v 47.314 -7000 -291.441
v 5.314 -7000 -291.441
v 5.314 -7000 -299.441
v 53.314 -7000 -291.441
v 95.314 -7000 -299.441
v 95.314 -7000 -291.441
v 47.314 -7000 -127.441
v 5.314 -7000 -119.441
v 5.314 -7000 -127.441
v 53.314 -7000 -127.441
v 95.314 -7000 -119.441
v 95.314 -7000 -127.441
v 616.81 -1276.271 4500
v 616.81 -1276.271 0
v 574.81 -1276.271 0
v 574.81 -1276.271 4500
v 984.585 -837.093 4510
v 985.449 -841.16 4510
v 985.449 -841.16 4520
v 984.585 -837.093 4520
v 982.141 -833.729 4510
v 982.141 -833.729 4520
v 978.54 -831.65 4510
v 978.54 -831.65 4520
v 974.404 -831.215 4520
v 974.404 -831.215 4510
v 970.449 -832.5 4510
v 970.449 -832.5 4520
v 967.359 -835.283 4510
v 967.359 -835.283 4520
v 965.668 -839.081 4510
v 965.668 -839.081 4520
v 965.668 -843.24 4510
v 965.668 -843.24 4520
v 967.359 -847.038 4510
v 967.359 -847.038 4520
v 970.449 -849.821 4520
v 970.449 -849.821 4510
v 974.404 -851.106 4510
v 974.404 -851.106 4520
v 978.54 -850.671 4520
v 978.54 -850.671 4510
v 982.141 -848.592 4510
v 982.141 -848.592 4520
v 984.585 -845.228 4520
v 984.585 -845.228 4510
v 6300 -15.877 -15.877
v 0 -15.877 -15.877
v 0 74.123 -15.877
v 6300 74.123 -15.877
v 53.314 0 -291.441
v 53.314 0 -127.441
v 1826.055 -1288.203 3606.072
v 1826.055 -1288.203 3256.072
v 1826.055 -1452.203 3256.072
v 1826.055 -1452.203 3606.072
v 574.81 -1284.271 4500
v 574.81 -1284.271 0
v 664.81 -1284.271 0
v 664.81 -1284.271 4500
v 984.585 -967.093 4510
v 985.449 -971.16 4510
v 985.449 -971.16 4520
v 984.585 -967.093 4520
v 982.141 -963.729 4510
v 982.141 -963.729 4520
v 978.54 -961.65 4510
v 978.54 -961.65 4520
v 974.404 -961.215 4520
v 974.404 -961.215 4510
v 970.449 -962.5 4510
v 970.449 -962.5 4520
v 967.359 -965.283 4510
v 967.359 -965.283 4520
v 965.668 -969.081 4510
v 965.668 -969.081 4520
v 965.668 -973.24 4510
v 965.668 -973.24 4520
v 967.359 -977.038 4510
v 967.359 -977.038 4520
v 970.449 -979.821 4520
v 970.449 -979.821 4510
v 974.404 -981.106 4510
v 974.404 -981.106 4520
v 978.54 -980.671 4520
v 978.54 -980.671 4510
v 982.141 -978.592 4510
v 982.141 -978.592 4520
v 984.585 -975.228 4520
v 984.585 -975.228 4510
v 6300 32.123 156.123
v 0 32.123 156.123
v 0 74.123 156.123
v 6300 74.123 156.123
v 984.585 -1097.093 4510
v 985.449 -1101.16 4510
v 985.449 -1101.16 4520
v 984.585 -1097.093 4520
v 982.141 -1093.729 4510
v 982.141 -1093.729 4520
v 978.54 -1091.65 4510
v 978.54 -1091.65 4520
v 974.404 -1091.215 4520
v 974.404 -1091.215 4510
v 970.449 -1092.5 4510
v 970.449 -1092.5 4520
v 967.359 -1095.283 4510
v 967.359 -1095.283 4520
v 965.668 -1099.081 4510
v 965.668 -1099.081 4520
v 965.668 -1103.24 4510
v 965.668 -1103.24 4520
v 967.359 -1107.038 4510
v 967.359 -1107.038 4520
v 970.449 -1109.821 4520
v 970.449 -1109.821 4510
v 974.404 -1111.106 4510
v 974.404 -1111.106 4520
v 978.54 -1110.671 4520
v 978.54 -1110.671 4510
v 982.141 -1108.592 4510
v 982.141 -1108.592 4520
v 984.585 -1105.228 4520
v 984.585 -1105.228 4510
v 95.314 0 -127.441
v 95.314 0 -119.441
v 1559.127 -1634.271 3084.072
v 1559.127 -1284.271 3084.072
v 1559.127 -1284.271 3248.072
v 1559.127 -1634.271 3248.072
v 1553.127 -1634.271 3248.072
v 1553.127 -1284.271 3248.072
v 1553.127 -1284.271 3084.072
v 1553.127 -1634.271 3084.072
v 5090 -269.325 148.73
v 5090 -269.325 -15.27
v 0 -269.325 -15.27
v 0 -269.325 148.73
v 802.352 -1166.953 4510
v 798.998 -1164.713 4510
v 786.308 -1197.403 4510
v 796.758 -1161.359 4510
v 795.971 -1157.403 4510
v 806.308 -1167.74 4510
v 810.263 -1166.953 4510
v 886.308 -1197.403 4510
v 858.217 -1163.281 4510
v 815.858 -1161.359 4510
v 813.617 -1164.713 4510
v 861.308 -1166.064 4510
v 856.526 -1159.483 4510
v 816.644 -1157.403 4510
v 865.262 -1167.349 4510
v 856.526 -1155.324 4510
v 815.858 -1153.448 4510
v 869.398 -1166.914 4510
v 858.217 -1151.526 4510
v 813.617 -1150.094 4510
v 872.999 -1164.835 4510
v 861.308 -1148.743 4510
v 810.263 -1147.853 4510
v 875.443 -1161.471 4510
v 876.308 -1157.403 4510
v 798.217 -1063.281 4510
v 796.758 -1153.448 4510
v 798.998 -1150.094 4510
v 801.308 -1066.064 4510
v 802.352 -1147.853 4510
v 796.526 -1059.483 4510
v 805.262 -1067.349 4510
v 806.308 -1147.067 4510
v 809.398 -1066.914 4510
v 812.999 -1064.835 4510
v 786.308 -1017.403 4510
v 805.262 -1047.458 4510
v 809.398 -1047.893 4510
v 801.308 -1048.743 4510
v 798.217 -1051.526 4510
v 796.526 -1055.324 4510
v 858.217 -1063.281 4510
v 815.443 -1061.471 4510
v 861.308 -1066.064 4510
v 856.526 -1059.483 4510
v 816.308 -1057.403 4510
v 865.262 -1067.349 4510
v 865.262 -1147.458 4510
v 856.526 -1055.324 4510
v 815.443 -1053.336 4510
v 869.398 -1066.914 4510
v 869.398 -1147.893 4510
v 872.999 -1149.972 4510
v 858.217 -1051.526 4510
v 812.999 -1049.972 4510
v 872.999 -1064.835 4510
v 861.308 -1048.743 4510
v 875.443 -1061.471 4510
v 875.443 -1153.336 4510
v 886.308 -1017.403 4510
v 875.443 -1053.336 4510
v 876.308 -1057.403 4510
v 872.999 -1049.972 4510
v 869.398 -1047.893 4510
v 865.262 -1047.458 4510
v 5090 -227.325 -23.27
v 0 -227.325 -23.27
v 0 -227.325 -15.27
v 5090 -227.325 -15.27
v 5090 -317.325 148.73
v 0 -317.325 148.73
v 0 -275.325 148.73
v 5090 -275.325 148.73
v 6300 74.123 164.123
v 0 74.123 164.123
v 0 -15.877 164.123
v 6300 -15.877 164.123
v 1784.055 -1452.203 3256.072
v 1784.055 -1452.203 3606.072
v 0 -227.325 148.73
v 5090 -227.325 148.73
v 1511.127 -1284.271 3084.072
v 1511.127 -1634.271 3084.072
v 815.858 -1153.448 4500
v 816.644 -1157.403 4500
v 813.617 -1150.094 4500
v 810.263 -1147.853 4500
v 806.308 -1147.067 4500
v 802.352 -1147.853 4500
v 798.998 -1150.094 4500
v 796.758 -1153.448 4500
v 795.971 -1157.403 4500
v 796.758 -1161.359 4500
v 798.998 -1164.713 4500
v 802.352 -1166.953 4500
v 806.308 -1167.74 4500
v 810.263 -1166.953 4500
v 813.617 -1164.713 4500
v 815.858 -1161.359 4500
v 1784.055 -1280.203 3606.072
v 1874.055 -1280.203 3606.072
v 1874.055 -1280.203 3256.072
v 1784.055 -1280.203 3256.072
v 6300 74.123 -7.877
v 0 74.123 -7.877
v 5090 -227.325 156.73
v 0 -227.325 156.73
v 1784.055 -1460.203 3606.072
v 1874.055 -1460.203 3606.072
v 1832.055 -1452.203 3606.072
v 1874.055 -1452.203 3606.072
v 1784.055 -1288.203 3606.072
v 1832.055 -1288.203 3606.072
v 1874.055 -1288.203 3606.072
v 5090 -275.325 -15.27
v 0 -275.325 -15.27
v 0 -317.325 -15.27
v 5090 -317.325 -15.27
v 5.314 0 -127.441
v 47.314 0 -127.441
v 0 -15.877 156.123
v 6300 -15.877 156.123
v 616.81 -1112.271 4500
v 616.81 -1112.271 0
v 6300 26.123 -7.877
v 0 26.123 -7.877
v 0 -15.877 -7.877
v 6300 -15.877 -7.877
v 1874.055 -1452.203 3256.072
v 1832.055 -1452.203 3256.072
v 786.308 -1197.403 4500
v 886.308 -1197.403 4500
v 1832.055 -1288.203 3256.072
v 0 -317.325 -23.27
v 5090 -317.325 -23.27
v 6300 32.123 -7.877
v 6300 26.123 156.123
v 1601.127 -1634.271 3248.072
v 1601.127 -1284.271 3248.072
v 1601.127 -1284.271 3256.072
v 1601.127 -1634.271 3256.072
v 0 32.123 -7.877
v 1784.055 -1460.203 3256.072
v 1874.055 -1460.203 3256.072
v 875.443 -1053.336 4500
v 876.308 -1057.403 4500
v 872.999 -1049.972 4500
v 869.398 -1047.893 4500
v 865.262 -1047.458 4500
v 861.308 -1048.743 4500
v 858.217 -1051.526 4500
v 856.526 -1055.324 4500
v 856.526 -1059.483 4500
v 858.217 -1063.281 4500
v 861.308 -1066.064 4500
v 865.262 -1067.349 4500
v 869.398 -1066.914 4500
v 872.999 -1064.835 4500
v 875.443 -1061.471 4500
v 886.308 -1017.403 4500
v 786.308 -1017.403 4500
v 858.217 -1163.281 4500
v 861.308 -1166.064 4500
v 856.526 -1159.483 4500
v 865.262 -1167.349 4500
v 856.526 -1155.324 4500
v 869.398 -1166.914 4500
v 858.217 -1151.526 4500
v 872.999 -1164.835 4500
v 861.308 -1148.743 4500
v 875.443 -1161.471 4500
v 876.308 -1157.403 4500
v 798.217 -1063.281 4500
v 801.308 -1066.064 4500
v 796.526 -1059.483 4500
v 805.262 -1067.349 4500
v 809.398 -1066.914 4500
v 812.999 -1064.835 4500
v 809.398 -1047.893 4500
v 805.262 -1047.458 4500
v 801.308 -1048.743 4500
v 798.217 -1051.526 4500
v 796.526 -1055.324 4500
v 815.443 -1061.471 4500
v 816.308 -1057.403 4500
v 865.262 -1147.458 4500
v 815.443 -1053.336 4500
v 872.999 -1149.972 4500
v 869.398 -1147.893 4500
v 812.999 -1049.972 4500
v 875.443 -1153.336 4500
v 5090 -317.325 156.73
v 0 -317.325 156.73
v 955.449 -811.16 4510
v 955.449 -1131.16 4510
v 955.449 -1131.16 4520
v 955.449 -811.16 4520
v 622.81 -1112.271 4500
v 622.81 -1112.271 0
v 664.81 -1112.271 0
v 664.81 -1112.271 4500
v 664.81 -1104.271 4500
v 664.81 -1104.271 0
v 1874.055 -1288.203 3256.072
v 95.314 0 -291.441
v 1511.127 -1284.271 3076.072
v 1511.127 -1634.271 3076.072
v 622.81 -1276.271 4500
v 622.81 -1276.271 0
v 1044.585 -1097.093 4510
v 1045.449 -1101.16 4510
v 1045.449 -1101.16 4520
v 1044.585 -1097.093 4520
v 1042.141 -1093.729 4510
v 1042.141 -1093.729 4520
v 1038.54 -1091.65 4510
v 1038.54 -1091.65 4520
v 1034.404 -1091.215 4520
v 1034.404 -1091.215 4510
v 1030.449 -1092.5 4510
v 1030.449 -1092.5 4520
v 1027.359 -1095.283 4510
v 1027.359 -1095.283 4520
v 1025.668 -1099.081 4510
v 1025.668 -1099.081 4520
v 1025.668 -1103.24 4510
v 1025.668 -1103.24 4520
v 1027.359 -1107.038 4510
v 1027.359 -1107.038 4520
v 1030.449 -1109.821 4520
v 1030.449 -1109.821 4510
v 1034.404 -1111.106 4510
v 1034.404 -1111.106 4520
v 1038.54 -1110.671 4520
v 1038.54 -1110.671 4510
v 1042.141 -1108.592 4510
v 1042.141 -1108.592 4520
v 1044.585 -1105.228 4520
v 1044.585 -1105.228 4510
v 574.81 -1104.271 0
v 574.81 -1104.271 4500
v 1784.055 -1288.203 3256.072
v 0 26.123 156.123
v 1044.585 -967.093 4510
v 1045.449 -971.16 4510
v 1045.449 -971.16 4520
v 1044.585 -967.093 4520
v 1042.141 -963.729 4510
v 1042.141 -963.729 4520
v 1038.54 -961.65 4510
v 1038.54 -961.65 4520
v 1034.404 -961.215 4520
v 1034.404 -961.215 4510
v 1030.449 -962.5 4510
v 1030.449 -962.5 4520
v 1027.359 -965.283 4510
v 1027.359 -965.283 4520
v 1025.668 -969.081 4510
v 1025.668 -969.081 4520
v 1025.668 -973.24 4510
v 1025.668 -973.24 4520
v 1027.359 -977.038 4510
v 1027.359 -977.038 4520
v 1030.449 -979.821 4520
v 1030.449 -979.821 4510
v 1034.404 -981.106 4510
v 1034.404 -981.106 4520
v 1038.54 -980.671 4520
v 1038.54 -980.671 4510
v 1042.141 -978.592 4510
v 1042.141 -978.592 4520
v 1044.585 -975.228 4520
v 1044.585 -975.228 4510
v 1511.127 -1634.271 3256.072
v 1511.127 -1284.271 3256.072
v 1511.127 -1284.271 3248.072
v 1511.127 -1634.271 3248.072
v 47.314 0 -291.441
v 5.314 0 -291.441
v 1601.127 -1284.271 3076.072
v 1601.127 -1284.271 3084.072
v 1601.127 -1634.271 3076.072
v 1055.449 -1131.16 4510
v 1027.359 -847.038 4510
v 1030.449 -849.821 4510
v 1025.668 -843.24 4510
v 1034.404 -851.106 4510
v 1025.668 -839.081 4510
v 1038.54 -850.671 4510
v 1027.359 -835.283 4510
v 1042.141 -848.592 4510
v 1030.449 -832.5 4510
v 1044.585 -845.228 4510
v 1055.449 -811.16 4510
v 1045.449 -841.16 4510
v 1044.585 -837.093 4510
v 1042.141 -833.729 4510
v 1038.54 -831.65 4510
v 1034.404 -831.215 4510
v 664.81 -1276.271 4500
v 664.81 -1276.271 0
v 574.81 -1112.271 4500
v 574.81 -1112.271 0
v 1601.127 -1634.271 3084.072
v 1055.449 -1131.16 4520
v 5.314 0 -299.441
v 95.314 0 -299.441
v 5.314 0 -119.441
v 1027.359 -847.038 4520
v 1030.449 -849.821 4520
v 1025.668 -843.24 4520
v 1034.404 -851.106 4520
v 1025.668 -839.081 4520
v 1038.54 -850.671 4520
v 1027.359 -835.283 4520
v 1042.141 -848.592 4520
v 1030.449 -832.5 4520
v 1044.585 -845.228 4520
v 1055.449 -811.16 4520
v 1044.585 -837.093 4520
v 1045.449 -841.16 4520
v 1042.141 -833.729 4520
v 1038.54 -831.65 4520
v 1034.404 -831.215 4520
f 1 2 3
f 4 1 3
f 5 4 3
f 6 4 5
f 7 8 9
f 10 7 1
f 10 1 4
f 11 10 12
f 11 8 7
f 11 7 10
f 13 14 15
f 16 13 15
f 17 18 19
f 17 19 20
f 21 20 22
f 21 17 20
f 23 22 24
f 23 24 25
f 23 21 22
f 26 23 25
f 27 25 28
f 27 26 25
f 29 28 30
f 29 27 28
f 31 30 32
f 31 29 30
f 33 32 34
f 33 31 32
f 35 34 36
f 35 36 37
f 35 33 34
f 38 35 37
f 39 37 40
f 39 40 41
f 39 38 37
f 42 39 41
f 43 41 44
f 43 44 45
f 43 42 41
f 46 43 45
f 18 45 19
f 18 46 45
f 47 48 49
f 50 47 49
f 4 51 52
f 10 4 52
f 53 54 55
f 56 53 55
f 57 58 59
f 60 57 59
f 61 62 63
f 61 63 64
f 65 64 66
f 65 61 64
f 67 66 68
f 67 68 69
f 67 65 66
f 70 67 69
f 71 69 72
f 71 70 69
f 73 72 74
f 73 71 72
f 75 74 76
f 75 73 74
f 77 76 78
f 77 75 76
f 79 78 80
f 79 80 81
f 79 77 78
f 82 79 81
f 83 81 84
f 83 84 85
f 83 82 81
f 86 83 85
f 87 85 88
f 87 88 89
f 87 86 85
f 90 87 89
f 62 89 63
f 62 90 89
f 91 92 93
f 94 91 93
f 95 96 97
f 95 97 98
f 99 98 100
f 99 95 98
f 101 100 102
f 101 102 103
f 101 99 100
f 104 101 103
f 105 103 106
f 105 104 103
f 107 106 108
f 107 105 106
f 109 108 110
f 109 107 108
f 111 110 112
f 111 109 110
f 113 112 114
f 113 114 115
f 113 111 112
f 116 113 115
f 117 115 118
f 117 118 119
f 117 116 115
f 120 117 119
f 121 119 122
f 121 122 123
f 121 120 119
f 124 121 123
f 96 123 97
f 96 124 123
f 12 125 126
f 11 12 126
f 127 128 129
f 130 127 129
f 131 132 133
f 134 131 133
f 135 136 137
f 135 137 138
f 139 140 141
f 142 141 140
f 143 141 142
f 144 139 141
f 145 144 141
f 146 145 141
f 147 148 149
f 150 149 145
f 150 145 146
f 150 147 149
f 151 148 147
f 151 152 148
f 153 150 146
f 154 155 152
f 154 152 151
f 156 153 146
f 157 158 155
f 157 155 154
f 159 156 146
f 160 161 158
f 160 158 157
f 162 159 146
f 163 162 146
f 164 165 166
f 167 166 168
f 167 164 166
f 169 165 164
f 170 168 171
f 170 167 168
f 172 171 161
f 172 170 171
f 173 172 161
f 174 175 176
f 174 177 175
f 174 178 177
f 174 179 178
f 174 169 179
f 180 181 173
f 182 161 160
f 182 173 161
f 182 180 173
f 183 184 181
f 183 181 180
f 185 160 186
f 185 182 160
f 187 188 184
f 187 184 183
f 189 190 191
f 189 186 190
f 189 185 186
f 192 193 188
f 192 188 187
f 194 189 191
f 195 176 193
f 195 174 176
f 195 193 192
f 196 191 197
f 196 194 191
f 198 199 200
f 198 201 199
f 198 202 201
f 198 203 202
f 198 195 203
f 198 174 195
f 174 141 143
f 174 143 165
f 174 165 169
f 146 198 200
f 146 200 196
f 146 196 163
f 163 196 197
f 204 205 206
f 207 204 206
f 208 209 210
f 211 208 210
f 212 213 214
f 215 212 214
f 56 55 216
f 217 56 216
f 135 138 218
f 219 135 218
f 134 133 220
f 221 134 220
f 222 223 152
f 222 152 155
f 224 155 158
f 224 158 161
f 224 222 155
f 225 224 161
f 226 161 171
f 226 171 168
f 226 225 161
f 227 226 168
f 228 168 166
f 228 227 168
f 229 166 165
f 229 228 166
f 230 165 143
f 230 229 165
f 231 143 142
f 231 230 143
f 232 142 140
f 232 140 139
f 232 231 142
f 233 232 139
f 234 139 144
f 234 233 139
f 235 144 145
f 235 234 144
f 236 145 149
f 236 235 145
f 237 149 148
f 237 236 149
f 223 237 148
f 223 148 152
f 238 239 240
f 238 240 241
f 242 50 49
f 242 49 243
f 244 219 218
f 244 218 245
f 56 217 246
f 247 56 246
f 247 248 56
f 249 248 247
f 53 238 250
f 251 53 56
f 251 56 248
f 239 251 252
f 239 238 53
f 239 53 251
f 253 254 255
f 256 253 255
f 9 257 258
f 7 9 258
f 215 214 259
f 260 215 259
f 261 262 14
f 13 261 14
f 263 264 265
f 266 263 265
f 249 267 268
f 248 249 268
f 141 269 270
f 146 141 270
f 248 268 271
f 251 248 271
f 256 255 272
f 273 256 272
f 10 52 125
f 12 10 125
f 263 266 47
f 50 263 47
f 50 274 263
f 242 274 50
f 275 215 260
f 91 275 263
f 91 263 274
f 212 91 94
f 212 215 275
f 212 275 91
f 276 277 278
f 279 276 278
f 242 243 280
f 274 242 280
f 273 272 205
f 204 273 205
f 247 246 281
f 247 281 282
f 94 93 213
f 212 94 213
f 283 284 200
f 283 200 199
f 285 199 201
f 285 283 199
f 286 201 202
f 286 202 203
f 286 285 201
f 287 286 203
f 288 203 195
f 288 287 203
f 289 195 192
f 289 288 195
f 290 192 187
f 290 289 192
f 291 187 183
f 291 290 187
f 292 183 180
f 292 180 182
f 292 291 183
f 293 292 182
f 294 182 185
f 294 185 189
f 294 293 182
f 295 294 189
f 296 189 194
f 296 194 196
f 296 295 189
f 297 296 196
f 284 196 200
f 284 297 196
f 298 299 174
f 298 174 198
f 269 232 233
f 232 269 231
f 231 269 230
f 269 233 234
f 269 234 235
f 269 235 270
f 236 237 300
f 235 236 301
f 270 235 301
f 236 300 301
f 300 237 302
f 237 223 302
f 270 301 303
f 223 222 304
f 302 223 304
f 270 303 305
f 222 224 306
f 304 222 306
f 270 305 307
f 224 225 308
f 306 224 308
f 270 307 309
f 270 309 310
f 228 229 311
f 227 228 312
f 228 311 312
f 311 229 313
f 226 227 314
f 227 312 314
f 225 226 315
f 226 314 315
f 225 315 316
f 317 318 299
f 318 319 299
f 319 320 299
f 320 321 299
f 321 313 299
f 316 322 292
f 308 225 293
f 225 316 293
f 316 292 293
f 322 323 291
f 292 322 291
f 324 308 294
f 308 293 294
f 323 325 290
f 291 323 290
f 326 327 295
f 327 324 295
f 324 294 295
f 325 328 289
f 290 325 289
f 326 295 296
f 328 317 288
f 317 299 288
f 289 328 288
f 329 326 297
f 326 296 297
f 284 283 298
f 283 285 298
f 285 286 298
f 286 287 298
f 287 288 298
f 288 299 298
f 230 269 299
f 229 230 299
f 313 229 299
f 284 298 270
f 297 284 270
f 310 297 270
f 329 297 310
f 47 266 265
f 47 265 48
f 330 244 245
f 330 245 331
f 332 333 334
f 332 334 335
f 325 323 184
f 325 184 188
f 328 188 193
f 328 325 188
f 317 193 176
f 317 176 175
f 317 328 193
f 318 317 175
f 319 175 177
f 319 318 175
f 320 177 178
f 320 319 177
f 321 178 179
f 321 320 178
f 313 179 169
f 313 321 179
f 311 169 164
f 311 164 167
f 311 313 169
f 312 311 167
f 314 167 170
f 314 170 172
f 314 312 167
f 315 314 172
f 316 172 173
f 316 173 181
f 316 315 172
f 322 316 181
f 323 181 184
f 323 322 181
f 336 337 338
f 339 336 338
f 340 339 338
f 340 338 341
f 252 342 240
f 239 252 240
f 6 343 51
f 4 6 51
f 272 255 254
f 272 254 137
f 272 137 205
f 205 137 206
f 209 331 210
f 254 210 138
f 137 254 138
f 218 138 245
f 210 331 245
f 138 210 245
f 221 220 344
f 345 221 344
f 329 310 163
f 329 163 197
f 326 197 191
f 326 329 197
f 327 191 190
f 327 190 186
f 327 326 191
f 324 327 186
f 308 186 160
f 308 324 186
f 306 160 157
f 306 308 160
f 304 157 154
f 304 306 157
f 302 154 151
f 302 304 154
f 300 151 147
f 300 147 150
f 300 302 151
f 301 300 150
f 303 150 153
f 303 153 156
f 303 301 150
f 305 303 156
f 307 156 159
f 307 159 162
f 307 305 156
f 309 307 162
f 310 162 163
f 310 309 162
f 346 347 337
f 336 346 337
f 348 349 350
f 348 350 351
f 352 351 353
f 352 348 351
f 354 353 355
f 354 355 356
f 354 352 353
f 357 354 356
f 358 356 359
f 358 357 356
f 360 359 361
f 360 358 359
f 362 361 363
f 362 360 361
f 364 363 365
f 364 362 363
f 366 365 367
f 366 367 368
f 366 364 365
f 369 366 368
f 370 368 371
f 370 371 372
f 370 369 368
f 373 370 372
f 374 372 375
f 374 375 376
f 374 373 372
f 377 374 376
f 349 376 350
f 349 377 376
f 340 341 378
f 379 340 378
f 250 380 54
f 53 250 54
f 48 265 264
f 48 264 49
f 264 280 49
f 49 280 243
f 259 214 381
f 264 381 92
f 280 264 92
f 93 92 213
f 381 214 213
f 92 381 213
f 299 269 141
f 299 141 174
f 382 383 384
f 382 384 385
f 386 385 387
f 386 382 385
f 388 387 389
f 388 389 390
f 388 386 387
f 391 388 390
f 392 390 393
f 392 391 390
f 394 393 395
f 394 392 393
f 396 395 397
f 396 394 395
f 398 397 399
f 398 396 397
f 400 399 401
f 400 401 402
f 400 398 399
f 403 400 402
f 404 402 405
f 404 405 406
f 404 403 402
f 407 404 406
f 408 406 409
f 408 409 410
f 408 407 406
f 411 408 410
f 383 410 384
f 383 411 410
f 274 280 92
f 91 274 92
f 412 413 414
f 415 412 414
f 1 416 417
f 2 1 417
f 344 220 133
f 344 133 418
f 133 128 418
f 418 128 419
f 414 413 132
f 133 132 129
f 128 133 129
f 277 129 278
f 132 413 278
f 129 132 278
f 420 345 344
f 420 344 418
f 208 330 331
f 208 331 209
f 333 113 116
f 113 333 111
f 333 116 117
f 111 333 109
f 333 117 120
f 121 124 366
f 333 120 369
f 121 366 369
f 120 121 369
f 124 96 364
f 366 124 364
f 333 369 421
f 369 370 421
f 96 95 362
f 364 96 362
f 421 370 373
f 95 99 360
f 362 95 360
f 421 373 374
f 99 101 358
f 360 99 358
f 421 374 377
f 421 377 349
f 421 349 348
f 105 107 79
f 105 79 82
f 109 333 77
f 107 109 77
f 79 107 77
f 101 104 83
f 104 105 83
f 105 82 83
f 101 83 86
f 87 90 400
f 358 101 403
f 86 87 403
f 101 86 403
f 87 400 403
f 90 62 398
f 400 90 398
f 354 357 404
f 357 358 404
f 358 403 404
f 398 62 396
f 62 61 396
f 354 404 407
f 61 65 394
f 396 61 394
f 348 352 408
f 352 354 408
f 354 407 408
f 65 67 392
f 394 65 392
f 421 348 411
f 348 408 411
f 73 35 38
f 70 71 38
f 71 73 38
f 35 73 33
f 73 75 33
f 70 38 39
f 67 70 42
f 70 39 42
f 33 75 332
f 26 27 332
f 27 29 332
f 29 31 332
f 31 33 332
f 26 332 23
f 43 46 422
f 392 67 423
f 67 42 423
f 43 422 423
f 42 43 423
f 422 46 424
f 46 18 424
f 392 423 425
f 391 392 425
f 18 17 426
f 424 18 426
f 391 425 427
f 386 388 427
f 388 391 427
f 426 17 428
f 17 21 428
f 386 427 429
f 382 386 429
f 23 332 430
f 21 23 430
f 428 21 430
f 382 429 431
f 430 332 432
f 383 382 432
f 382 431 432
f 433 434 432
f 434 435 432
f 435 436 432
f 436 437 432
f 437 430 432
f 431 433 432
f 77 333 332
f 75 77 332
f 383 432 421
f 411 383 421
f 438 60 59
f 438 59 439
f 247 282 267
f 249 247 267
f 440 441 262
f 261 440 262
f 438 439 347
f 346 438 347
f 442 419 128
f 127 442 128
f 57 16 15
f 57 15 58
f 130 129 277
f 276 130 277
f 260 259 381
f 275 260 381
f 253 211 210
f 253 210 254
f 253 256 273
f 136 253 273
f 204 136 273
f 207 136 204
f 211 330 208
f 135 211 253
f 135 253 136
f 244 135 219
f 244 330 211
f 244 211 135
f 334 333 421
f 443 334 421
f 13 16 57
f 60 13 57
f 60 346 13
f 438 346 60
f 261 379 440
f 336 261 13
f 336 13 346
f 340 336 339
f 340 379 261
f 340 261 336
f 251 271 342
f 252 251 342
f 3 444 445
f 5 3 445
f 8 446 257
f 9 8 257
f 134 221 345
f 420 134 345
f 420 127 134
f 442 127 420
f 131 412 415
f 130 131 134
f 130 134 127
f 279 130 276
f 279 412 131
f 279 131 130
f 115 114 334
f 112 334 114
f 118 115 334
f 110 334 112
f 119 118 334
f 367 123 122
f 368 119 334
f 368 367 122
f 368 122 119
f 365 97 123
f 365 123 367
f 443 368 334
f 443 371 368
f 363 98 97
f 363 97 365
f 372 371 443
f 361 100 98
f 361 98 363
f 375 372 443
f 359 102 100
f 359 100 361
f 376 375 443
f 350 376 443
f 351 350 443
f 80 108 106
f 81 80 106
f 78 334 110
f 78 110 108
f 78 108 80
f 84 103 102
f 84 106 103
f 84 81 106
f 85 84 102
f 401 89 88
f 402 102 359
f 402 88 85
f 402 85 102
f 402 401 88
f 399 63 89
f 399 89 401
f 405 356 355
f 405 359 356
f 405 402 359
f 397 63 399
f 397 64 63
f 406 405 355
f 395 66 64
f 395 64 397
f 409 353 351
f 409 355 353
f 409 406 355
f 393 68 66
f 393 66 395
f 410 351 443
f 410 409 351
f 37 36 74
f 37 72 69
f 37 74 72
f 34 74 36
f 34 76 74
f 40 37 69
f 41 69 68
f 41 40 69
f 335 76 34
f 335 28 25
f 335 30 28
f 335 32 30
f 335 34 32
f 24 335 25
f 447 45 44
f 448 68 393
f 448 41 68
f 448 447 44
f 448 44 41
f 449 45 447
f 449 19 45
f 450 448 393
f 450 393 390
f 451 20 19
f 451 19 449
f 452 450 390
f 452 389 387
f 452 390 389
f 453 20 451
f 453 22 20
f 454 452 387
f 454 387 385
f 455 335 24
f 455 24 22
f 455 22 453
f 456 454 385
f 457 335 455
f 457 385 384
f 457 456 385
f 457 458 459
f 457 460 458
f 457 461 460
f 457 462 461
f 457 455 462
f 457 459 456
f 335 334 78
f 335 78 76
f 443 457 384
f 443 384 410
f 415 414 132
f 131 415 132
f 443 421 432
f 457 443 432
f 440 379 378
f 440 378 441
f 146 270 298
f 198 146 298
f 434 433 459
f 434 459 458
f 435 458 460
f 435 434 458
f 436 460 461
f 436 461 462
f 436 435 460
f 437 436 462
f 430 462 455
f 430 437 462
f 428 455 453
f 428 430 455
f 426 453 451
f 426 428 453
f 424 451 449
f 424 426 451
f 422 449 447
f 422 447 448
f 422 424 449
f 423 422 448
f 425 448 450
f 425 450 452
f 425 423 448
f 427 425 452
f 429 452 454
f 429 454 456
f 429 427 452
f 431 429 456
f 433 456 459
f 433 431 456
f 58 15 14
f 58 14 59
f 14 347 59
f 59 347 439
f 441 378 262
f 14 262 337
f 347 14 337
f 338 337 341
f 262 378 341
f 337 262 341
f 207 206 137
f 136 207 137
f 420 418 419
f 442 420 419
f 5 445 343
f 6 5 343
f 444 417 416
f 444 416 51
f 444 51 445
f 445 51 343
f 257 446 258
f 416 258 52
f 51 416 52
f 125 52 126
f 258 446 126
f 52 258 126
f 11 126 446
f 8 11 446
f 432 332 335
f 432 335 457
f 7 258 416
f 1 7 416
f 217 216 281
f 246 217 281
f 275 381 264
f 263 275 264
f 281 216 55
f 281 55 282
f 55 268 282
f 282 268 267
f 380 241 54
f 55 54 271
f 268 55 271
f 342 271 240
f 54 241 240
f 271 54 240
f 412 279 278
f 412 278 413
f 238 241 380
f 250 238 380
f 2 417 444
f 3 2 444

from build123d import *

# Parameters (mm, degrees)
F1_DEPTH  = 6300
F3_DEPTH  = 7000
F5_DEPTH  = 5090
F7_DEPTH  = 4500
F8_W      = 100
F8_H      = 180
F8_R      = 10.336789
F8_R_2    = 10
F9_DEPTH  = 10
F10_W     = 100
F10_H     = 320
F10_R     = 10
F11_DEPTH = 10
F13_DEPTH = 350
F15_DEPTH = 350


with BuildPart() as f1:
    # F0 (on Right) → F1 (new body)
    with BuildSketch(Plane.YZ):
        Polygon((-15.877016, -15.877018), (74.122984, -15.877018), (74.122984, -7.877018), (32.122984, -7.877018), (32.122984, 156.122982), (74.122984, 156.122982), (74.122984, 164.122982), (-15.877016, 164.122982), (-15.877016, 156.122982), (26.122984, 156.122982), (26.122984, -7.877018), (-15.877016, -7.877018), align=None)
    extrude(amount=F1_DEPTH)


with BuildPart() as f3:
    # F2 (on Front) → F3 (new body)
    with BuildSketch(Plane.XZ):
        Polygon((5.31354, -291.441248), (5.31354, -299.441248), (95.31354, -299.441248), (95.31354, -291.441248), (53.31354, -291.441248), (53.31354, -127.441248), (95.31354, -127.441248), (95.31354, -119.441248), (5.31354, -119.441248), (5.31354, -127.441248), (47.31354, -127.441248), (47.31354, -291.441248), align=None)
    extrude(amount=F3_DEPTH)


with BuildPart() as f5:
    # F4 (on Right) → F5 (new body)
    with BuildSketch(Plane.YZ):
        Polygon((-317.324877, -23.269771), (-227.324877, -23.269771), (-227.324877, -15.269771), (-269.324877, -15.269771), (-269.324877, 148.730229), (-227.324877, 148.730229), (-227.324877, 156.730229), (-317.324877, 156.730229), (-317.324877, 148.730229), (-275.324877, 148.730229), (-275.324877, -15.269771), (-317.324877, -15.269771), align=None)
    extrude(amount=F5_DEPTH)


with BuildPart() as f7:
    # F6 (on Top) → F7 (new body)
    with BuildSketch(Plane.XY):
        Polygon((574.810386, -1276.270883), (574.810386, -1284.270883), (664.810386, -1284.270883), (664.810386, -1276.270883), (622.810386, -1276.270883), (622.810386, -1112.270883), (664.810386, -1112.270883), (664.810386, -1104.270883), (574.810386, -1104.270883), (574.810386, -1112.270883), (616.810386, -1112.270883), (616.810386, -1276.270883), align=None)
    extrude(amount=F7_DEPTH)


with BuildPart() as f9:
    # F8 (on face) → F9 (new body)
    with BuildSketch(Plane.XY.offset(4500)):
        with Locations((836.307573, -1107.403431)):
            Rectangle(F8_W, F8_H)
        with Locations((806.307573, -1157.403431)):
            Circle(F8_R, mode=Mode.SUBTRACT)
        with Locations((866.307573, -1157.403431)):
            Circle(F8_R_2, mode=Mode.SUBTRACT)
        with Locations((806.307573, -1057.403431)):
            Circle(F8_R_2, mode=Mode.SUBTRACT)
        with Locations((866.307573, -1057.403431)):
            Circle(F8_R_2, mode=Mode.SUBTRACT)
    extrude(amount=F9_DEPTH)


with BuildPart() as f11:
    # F10 (on face) → F11 (new body)
    with BuildSketch(Plane.XY.offset(4510)):
        with Locations((1005.449462, -971.160498)):
            Rectangle(F10_W, F10_H)
        with Locations((975.449462, -1101.160498)):
            Circle(F10_R, mode=Mode.SUBTRACT)
        with Locations((1035.449462, -1101.160498)):
            Circle(F10_R, mode=Mode.SUBTRACT)
        with Locations((975.449462, -971.160498)):
            Circle(F10_R, mode=Mode.SUBTRACT)
        with Locations((1035.449462, -971.160498)):
            Circle(F10_R, mode=Mode.SUBTRACT)
        with Locations((975.449462, -841.160498)):
            Circle(F10_R, mode=Mode.SUBTRACT)
        with Locations((1035.449462, -841.160498)):
            Circle(F10_R, mode=Mode.SUBTRACT)
    extrude(amount=F11_DEPTH)


with BuildPart() as f13:
    # F12 (on face) → F13 (new body)
    with BuildSketch(Plane.XZ.offset(1284.270883)):
        Polygon((1511.126995, 3084.071739), (1511.126995, 3076.071739), (1601.126995, 3076.071739), (1601.126995, 3084.071739), (1559.126995, 3084.071739), (1559.126995, 3248.071739), (1601.126995, 3248.071739), (1601.126995, 3256.071739), (1511.126995, 3256.071739), (1511.126995, 3248.071739), (1553.126995, 3248.071739), (1553.126995, 3084.071739), align=None)
    extrude(amount=F13_DEPTH)


with BuildPart() as f15:
    # F14 (on face) → F15 (new body)
    with BuildSketch(Plane.XY.offset(3256.071739)):
        Polygon((1874.054637, -1280.202508), (1784.054637, -1280.202508), (1784.054637, -1288.202508), (1826.054637, -1288.202508), (1826.054637, -1452.202508), (1784.054637, -1452.202508), (1784.054637, -1460.202508), (1874.054637, -1460.202508), (1874.054637, -1452.202508), (1832.054637, -1452.202508), (1832.054637, -1288.202508), (1874.054637, -1288.202508), align=None)
    extrude(amount=F15_DEPTH)


solid = Compound([f1.part, f3.part, f5.part, f7.part, f9.part, f11.part, f13.part, f15.part])
